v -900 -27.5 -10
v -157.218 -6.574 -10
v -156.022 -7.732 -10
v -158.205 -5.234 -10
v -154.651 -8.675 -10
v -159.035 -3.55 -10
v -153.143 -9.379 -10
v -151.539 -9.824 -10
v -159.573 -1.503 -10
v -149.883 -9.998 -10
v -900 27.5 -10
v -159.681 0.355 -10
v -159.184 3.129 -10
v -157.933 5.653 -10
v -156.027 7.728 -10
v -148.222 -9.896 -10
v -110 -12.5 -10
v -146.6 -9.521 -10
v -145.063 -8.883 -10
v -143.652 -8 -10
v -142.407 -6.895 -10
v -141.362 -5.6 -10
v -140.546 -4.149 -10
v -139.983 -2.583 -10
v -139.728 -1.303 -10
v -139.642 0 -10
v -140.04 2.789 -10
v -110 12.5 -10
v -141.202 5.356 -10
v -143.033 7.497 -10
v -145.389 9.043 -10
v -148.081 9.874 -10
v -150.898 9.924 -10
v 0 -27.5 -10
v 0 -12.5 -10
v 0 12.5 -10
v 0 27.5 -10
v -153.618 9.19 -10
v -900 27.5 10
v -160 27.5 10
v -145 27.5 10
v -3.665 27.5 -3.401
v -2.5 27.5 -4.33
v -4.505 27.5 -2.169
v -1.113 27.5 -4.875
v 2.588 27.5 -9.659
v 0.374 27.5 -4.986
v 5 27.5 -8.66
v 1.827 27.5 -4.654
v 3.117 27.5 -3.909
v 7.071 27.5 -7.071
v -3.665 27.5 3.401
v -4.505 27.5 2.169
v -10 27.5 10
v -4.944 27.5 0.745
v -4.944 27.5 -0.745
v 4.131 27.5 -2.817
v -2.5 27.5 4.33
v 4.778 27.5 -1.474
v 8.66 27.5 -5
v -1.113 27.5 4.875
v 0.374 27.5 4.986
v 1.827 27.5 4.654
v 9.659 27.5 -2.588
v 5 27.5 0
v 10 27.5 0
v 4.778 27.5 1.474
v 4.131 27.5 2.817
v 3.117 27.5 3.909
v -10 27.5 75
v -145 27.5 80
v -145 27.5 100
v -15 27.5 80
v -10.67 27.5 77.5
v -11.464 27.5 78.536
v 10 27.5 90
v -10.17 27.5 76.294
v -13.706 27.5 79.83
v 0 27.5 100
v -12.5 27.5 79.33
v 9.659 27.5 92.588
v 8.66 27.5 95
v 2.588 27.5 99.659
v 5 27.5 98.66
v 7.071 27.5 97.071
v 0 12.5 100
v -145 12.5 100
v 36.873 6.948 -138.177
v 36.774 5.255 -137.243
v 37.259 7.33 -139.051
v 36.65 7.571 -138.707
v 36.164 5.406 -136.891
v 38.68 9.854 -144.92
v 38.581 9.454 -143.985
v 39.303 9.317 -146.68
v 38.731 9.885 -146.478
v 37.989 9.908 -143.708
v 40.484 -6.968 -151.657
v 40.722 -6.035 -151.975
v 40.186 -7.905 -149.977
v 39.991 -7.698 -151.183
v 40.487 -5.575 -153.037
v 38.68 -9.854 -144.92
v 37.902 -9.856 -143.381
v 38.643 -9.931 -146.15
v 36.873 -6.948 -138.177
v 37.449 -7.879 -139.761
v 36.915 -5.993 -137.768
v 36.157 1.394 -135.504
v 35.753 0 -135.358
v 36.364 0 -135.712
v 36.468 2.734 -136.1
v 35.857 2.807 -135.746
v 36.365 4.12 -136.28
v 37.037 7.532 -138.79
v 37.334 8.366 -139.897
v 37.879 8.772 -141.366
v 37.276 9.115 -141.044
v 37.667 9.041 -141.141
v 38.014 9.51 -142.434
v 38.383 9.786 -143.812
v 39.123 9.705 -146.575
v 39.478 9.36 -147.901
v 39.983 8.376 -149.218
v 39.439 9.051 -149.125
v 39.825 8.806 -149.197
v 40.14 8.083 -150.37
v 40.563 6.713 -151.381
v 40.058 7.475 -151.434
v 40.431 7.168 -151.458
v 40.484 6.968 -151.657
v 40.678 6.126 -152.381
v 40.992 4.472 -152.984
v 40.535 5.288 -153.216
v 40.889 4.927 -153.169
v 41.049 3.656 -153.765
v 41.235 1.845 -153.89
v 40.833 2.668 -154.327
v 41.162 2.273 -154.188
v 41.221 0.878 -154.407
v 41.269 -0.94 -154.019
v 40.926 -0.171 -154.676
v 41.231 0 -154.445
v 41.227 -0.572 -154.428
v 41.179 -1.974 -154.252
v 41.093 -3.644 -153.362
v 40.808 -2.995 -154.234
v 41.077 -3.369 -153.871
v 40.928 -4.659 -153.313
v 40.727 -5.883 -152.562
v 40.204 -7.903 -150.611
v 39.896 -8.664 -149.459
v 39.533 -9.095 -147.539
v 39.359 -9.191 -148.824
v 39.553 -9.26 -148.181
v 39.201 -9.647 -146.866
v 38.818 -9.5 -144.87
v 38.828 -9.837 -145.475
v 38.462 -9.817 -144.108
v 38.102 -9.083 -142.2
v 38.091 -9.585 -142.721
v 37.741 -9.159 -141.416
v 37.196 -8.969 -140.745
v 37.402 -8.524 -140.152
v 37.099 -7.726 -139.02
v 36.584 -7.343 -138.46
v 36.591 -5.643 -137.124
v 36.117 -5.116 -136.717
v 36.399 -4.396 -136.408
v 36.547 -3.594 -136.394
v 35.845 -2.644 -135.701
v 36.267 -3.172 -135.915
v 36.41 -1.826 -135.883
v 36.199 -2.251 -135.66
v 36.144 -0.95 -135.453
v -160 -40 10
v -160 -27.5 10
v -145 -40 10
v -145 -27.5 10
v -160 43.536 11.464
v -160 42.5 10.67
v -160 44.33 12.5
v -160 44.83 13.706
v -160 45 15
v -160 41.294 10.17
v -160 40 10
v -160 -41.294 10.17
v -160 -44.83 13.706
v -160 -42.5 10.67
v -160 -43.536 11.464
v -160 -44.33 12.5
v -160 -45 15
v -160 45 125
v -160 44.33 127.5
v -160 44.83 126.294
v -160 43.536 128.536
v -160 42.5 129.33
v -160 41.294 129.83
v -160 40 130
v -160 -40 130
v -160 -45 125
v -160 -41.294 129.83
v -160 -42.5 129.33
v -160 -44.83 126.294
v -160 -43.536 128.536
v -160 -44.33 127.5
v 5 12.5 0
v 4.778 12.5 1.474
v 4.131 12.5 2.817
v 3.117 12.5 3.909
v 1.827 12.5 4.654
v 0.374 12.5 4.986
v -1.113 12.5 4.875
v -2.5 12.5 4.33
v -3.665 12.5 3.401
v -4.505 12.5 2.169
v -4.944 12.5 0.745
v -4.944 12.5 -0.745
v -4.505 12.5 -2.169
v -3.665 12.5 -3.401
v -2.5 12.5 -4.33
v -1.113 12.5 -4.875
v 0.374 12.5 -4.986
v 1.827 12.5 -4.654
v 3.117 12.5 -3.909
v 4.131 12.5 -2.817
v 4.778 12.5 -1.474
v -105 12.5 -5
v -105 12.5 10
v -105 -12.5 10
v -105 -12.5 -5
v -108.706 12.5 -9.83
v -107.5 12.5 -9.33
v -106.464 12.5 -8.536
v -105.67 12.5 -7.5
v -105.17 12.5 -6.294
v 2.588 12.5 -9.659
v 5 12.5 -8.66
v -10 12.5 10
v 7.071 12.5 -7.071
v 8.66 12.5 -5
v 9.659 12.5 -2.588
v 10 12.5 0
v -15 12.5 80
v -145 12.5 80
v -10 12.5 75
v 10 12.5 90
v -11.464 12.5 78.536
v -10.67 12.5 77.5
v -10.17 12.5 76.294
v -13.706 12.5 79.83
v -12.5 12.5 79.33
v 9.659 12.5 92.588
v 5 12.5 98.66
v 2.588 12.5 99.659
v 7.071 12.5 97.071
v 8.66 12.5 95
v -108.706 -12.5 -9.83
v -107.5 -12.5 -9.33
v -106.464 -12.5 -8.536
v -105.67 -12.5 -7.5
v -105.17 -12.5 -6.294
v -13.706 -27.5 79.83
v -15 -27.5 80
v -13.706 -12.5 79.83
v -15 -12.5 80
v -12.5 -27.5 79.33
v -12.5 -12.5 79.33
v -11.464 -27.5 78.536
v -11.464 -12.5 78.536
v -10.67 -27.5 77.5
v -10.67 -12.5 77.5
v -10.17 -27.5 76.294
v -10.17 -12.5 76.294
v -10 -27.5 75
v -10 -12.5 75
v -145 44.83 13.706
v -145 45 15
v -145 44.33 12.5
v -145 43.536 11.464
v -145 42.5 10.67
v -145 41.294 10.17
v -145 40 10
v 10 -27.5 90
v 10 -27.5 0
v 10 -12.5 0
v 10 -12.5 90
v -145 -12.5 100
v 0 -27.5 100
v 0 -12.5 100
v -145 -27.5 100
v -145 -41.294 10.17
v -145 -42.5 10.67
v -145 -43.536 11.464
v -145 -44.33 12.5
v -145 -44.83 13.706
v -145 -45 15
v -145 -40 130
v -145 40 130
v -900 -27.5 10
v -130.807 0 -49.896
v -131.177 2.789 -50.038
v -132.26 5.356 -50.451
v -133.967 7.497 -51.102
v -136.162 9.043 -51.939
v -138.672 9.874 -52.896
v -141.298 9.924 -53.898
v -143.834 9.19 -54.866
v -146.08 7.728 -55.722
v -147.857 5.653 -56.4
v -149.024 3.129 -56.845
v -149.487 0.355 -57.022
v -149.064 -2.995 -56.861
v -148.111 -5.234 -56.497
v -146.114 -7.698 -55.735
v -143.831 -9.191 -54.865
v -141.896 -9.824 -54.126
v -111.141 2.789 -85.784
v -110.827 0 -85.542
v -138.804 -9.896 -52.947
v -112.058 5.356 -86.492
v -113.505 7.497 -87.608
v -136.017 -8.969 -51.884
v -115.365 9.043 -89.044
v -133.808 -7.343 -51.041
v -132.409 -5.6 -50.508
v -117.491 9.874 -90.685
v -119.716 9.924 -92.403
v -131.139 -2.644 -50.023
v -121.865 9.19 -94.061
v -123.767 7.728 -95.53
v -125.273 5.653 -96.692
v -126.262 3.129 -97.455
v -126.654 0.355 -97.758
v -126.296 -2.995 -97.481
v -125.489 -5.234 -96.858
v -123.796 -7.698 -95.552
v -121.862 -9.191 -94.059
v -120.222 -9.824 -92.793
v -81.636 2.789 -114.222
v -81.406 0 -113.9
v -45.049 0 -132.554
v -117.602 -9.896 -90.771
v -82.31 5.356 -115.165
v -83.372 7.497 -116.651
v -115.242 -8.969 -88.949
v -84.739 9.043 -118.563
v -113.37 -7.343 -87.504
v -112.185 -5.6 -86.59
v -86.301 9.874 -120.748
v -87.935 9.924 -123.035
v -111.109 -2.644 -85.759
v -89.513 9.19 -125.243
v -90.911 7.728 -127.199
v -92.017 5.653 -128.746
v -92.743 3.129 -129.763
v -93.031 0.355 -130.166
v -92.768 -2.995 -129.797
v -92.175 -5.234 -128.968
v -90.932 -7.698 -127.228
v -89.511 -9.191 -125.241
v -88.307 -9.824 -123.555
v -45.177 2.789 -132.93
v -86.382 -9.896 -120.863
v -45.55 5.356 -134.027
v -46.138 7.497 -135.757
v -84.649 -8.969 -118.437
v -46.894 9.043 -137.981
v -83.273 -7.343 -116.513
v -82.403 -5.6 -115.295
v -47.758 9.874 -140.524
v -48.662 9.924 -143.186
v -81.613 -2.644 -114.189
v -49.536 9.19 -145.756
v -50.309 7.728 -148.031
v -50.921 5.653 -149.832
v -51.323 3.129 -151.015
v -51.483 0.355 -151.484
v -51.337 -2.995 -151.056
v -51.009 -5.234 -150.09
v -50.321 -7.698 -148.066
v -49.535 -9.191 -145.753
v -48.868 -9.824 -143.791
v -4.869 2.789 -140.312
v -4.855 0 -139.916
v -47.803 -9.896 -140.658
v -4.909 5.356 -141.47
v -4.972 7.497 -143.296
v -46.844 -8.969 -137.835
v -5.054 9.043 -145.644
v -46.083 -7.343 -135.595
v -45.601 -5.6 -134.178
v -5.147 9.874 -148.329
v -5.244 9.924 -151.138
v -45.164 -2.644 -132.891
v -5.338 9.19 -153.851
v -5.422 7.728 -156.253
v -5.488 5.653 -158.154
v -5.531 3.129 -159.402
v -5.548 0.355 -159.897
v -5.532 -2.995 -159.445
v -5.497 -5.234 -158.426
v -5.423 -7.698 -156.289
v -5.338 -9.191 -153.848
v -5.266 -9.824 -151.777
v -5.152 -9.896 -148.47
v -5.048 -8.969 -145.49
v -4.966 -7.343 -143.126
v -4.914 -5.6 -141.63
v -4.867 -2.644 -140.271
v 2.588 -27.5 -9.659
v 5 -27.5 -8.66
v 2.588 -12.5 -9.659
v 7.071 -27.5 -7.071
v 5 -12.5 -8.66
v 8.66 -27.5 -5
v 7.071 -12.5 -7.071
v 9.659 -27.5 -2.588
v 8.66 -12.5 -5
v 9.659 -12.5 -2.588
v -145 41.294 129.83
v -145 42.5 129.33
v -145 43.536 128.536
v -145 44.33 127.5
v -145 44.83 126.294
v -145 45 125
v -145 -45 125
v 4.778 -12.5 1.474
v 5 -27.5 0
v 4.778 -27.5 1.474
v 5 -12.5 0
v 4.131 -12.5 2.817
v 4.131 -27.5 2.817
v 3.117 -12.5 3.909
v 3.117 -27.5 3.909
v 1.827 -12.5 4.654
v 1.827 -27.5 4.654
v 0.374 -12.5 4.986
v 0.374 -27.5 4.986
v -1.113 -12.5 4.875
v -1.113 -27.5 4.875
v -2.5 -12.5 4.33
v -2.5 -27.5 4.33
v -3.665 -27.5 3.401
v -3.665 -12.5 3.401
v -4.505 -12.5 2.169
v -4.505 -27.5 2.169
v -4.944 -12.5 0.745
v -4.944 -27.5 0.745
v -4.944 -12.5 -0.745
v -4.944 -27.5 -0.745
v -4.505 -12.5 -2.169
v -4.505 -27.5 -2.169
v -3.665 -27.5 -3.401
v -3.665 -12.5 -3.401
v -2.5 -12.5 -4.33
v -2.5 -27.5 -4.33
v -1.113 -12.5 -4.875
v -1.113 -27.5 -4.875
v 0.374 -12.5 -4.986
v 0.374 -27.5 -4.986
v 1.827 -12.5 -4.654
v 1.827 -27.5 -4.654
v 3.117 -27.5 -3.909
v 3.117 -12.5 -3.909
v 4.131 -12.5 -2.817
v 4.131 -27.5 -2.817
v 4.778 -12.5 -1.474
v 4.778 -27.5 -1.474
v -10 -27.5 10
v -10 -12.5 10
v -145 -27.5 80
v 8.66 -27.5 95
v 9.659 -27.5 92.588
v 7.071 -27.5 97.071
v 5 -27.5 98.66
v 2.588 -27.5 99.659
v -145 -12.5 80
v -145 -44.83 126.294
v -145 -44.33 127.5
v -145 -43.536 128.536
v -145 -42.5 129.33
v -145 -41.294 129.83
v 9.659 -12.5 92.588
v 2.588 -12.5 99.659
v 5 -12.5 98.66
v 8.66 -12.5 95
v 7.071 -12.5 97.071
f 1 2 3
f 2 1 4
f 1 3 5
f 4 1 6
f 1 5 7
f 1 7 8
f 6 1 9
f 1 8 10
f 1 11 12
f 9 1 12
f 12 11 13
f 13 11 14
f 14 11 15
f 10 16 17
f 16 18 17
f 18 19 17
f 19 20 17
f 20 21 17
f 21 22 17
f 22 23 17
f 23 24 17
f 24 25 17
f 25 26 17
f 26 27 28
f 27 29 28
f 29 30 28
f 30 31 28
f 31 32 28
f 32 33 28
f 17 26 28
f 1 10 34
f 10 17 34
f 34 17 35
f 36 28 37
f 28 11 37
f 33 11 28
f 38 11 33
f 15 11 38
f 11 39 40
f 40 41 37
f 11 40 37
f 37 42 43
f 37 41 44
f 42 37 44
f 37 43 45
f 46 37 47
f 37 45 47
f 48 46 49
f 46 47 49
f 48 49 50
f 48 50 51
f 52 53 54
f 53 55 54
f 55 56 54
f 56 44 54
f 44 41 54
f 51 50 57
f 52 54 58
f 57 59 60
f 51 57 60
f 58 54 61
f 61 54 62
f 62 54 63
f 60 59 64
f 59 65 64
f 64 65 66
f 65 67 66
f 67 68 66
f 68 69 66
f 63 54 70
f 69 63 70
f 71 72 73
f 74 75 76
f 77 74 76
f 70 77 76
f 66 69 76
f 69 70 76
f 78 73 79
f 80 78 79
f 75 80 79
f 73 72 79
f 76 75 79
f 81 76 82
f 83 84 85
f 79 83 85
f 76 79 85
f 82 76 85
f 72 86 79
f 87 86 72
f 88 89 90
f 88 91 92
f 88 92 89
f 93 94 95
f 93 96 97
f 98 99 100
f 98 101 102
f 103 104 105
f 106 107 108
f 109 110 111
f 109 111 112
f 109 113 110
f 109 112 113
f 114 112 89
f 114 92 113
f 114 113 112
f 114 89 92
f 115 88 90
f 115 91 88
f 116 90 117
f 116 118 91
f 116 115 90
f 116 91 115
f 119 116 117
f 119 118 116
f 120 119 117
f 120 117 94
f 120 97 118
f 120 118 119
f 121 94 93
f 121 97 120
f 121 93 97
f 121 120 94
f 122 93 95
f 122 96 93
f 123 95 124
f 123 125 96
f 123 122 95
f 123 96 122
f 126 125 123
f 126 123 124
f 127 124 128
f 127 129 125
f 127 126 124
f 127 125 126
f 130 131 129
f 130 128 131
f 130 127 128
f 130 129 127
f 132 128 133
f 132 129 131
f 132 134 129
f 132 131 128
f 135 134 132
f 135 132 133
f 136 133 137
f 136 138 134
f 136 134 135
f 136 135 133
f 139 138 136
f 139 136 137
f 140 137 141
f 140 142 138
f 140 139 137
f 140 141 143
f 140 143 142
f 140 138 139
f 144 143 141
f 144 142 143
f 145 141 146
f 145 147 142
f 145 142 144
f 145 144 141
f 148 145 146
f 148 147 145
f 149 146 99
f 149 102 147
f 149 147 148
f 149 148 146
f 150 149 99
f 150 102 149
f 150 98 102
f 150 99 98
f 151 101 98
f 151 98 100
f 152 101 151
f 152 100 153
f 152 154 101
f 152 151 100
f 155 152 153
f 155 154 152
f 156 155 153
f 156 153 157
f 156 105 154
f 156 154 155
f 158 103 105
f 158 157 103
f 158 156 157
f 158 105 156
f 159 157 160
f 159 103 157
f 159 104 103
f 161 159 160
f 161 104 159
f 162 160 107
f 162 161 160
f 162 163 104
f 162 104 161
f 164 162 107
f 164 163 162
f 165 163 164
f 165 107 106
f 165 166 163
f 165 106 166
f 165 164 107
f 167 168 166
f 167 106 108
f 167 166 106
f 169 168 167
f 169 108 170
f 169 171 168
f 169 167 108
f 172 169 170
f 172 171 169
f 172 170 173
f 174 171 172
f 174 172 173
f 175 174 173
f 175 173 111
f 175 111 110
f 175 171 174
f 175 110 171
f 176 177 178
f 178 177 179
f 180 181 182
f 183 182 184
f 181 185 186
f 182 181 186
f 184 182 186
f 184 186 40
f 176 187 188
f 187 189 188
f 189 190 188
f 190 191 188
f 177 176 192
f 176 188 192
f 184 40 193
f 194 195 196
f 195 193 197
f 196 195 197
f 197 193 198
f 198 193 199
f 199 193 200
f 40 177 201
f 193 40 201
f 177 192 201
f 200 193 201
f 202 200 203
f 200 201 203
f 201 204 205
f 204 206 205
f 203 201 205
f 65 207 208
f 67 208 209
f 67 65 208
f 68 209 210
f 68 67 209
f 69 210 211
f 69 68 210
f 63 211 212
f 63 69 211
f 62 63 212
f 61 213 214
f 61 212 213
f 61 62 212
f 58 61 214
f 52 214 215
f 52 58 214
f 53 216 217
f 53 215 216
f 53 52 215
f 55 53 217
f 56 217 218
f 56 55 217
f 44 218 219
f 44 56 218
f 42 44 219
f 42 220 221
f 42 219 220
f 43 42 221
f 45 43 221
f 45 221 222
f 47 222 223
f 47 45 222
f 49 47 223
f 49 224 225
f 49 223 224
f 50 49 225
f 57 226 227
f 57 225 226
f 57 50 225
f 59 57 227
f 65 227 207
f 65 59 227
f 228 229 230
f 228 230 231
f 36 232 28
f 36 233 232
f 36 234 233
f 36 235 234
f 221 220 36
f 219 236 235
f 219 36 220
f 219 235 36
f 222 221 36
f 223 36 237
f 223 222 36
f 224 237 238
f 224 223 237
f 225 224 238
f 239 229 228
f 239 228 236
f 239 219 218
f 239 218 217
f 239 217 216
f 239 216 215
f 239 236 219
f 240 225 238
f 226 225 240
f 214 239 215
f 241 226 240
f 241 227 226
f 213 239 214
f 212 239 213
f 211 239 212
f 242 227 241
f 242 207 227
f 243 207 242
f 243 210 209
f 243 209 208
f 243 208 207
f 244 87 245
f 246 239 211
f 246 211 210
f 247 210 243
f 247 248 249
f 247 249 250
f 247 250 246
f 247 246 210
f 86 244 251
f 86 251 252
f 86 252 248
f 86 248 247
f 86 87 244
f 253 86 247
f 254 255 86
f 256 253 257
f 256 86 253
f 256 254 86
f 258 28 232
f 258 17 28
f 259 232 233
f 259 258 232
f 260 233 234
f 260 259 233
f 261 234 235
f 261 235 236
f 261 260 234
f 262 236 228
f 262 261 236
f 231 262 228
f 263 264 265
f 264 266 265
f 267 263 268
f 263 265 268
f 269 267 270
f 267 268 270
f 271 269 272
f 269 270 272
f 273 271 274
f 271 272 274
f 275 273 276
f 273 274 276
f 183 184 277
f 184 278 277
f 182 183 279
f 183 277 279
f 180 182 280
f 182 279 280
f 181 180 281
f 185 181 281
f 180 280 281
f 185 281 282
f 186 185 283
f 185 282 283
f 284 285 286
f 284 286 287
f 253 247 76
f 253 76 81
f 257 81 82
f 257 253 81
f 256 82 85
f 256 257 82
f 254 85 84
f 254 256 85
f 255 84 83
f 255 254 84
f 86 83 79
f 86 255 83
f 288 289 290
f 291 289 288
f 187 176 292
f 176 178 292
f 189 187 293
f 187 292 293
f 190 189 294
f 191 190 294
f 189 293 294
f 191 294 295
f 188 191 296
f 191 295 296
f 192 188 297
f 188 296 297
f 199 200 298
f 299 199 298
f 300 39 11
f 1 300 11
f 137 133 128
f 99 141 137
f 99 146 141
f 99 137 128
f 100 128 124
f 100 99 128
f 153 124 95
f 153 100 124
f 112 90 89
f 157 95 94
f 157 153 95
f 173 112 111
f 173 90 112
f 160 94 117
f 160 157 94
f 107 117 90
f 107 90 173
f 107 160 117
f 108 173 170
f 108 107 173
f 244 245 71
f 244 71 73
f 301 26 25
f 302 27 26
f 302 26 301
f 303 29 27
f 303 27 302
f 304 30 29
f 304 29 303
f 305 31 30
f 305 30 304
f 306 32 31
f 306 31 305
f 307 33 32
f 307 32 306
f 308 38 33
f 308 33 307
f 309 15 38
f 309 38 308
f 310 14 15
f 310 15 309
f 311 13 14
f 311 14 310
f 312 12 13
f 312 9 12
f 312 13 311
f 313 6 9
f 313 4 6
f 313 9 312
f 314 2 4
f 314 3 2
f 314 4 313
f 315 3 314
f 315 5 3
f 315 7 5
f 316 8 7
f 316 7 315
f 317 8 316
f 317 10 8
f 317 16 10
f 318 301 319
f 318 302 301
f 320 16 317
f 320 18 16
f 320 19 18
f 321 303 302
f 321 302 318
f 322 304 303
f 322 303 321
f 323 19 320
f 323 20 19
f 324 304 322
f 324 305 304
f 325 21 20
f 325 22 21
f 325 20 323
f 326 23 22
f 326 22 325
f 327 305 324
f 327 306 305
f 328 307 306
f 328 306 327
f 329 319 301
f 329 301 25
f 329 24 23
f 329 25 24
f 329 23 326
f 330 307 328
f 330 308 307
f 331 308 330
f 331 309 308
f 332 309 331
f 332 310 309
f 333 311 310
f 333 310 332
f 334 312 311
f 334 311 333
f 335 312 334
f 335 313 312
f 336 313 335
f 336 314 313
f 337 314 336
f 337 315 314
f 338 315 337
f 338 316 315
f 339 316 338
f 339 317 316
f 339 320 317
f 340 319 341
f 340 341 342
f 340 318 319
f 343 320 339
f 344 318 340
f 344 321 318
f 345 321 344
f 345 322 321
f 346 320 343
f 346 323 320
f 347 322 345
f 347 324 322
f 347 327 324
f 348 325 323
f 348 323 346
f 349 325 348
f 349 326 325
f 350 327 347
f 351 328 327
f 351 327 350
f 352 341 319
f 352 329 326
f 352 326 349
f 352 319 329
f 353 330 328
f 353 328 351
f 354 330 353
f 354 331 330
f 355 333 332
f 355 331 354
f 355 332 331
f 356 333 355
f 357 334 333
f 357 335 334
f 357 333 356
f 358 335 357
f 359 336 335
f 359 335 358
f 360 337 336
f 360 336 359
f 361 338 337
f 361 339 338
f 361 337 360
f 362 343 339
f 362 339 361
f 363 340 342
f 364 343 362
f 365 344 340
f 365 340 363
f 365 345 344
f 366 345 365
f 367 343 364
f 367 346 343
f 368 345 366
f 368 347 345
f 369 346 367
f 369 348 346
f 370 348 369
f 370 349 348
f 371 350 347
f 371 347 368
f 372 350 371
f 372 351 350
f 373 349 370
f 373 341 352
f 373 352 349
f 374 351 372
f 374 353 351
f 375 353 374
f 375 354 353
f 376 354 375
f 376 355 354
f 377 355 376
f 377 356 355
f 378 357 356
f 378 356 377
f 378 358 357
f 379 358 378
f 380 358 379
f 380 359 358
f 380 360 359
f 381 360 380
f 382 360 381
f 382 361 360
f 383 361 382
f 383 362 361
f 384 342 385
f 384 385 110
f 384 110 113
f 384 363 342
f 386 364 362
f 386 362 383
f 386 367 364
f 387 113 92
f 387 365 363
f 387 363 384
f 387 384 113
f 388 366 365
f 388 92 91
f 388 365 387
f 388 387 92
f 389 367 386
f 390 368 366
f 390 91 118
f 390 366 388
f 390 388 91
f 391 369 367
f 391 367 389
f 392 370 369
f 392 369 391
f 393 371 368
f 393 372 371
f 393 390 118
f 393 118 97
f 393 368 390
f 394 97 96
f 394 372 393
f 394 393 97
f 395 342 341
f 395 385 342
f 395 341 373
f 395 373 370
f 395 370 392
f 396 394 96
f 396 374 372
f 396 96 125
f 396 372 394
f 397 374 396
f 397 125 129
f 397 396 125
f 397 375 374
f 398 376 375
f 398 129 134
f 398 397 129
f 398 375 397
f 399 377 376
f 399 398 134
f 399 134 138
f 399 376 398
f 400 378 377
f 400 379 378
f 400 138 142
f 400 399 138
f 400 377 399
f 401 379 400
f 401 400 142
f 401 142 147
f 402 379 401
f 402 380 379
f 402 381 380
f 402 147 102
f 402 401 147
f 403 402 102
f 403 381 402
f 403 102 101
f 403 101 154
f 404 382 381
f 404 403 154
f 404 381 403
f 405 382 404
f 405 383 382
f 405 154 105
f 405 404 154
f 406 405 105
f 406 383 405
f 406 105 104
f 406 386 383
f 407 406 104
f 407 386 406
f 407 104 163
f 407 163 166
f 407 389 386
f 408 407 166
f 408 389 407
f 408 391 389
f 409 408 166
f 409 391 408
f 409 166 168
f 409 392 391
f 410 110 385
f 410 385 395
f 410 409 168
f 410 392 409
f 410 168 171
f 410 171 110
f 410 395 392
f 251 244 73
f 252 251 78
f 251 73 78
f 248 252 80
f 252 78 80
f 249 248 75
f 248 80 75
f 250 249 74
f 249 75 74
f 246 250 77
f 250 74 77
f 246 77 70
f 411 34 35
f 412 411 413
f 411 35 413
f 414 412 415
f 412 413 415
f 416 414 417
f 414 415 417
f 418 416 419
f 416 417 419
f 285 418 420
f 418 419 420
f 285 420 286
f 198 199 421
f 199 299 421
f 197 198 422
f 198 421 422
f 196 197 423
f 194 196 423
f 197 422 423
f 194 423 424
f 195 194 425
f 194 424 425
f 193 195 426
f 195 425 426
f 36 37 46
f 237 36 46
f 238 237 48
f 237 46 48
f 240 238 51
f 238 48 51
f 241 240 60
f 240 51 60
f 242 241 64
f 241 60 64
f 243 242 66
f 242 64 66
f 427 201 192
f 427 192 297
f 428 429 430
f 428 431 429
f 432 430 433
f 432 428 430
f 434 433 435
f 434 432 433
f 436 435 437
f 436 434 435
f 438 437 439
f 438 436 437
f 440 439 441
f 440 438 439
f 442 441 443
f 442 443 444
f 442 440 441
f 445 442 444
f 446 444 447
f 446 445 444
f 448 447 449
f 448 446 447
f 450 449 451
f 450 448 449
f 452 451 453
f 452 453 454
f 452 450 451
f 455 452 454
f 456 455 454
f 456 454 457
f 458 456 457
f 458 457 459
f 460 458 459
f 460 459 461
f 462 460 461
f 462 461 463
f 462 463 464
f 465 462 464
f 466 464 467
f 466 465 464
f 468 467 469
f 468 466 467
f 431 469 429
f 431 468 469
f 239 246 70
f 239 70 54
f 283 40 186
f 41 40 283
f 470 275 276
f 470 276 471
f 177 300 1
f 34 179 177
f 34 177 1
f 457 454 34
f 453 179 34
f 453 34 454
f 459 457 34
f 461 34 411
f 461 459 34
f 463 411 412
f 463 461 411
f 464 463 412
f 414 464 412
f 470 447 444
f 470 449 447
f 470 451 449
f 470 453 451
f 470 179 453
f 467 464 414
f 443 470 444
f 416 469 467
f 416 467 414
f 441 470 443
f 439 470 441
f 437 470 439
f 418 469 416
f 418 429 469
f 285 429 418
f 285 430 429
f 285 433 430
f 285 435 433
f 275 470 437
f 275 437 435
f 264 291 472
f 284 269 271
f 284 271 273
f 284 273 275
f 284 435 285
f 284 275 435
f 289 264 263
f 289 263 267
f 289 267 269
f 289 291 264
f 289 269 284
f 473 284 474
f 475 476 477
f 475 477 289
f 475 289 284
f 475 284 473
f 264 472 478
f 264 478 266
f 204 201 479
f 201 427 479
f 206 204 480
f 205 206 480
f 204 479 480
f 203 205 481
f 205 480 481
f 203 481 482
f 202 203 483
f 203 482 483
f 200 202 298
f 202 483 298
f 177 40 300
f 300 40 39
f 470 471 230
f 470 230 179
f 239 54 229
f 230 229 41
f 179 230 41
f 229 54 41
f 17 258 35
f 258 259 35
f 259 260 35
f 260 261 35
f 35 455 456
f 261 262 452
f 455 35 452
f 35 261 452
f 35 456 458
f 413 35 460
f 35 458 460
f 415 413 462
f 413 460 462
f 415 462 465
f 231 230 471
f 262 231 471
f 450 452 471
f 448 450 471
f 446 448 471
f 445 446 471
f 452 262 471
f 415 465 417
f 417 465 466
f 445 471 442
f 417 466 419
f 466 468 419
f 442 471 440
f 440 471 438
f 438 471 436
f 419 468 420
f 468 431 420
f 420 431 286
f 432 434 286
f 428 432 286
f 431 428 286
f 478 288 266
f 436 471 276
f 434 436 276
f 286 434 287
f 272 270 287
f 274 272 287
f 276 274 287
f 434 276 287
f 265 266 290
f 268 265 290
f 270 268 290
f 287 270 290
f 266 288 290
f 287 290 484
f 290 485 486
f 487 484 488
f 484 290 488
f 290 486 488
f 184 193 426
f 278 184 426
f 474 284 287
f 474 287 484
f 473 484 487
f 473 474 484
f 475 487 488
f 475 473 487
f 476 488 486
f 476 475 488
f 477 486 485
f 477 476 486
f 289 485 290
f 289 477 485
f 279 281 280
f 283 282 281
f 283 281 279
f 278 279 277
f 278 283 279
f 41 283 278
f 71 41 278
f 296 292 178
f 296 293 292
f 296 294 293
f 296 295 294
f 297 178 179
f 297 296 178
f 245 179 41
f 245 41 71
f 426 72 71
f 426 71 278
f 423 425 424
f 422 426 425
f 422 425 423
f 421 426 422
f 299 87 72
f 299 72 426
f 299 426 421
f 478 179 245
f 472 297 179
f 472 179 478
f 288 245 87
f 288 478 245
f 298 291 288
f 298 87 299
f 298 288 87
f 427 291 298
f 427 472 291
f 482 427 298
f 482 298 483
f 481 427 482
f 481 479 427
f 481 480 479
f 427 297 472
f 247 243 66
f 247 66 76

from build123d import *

# Parameters (mm, degrees)
F0_R           = 5
F1_DEPTH       = 27.5
F1_DEPTH_BACK  = 27.5
F4_R           = 5
F5_DEPTH       = 55
F7_DEPTH       = 12.5
F7_DEPTH_BACK  = 12.5
F9_W           = 15
F9_H           = 120
F10_DEPTH      = 45
F10_DEPTH_BACK = 45
F11_R          = 5
F12_R          = 5
F14_R          = 10
F16_R          = 5
F17_R          = 0.5


with BuildPart() as f1:
    # F0 (on Front) → F1 (new body, two sides)
    with BuildSketch(Plane.XZ) as f1_sk:
        with BuildLine():
            Line((-900, -10), (0, -10))
            ThreePointArc((0, -10), (10, 0), (0, 10))
            Line((0, 10), (-900, 10))
            Line((-900, 10), (-900, -10))
        make_face()
        Circle(F0_R, mode=Mode.SUBTRACT)
    extrude(amount=-F1_DEPTH)
    extrude(f1_sk.sketch, amount=F1_DEPTH_BACK)

    # F4 (on offset) → F5 (join)
    with BuildSketch(Plane.XZ.offset(27.5)):
        with BuildLine():
            Line((-10, 80), (-10, 0))
            ThreePointArc((-10, 0), (0, -10), (10, 0))
            Line((10, 0), (10, 90))
            ThreePointArc((10, 90), (7.0710678119, 97.0710678119), (0, 100))
            Line((0, 100), (-145, 100))
            Line((-145, 100), (-145, 80))
            Line((-145, 80), (-10, 80))
        make_face()
        Circle(F4_R, mode=Mode.SUBTRACT)
    extrude(amount=-F5_DEPTH)

    # F6 (on offset) → F7 (cut, two sides)
    with BuildSketch(Plane.XZ) as f7_sk:
        Polygon((-105, -42.0839144895), (30, -42.0839144895), (30, 107.9160855105), (-145, 107.9160855105), (-145, 27.9160855105), (-105, 28.3714774996), align=None)
    extrude(amount=-F7_DEPTH, mode=Mode.SUBTRACT)
    extrude(f7_sk.sketch, amount=F7_DEPTH_BACK, mode=Mode.SUBTRACT)

    # F9 (on offset) → F10 (join, two sides)
    with BuildSketch(Plane.XZ) as f10_sk:
        with Locations((-152.5, 70)):
            Rectangle(F9_W, F9_H)
    extrude(amount=F10_DEPTH)
    extrude(f10_sk.sketch, amount=-F10_DEPTH_BACK)

    # F11
    f11_edges = [f1.edges().sort_by_distance(p)[0] for p in [
        (-152.5, -45, 130),
        (-152.5, 45, 130),
        (-152.5, -45, 10),
        (-152.5, 45, 10),
    ]]
    fillet(f11_edges, radius=F11_R)

    # F12
    f12_edges = [f1.edges().sort_by_distance(p)[0] for p in [
        (-10, -20, 80),
        (-10, 20, 80),
    ]]
    fillet(f12_edges, radius=F12_R)

    # F15: sweep along a path in F8
    with BuildLine(Plane.XZ) as f15_path:
        ThreePointArc((-150, 0), (-91.3142143513, -119.0030010437), (38.8228567654, -144.8888739434))
    # F14 (on offset) → F15 (sweep)
    with BuildSketch(Plane(origin=(0, 0, 0), x_dir=(1, 0, 0), z_dir=(0, 0, -1))):
        with Locations((-150, 0)):
            Circle(F14_R)
    sweep(path=f15_path.line)

    # F16
    f16_edges = [f1.edges().sort_by_distance(p)[0] for p in [
        (-105, 0, -10),
    ]]
    fillet(f16_edges, radius=F16_R)

    # F17
    f17_edges = [f1.edges().sort_by_distance(p)[0] for p in [
        (41.411047, 0, -154.548132),
    ]]
    fillet(f17_edges, radius=F17_R)


solid = f1.part
